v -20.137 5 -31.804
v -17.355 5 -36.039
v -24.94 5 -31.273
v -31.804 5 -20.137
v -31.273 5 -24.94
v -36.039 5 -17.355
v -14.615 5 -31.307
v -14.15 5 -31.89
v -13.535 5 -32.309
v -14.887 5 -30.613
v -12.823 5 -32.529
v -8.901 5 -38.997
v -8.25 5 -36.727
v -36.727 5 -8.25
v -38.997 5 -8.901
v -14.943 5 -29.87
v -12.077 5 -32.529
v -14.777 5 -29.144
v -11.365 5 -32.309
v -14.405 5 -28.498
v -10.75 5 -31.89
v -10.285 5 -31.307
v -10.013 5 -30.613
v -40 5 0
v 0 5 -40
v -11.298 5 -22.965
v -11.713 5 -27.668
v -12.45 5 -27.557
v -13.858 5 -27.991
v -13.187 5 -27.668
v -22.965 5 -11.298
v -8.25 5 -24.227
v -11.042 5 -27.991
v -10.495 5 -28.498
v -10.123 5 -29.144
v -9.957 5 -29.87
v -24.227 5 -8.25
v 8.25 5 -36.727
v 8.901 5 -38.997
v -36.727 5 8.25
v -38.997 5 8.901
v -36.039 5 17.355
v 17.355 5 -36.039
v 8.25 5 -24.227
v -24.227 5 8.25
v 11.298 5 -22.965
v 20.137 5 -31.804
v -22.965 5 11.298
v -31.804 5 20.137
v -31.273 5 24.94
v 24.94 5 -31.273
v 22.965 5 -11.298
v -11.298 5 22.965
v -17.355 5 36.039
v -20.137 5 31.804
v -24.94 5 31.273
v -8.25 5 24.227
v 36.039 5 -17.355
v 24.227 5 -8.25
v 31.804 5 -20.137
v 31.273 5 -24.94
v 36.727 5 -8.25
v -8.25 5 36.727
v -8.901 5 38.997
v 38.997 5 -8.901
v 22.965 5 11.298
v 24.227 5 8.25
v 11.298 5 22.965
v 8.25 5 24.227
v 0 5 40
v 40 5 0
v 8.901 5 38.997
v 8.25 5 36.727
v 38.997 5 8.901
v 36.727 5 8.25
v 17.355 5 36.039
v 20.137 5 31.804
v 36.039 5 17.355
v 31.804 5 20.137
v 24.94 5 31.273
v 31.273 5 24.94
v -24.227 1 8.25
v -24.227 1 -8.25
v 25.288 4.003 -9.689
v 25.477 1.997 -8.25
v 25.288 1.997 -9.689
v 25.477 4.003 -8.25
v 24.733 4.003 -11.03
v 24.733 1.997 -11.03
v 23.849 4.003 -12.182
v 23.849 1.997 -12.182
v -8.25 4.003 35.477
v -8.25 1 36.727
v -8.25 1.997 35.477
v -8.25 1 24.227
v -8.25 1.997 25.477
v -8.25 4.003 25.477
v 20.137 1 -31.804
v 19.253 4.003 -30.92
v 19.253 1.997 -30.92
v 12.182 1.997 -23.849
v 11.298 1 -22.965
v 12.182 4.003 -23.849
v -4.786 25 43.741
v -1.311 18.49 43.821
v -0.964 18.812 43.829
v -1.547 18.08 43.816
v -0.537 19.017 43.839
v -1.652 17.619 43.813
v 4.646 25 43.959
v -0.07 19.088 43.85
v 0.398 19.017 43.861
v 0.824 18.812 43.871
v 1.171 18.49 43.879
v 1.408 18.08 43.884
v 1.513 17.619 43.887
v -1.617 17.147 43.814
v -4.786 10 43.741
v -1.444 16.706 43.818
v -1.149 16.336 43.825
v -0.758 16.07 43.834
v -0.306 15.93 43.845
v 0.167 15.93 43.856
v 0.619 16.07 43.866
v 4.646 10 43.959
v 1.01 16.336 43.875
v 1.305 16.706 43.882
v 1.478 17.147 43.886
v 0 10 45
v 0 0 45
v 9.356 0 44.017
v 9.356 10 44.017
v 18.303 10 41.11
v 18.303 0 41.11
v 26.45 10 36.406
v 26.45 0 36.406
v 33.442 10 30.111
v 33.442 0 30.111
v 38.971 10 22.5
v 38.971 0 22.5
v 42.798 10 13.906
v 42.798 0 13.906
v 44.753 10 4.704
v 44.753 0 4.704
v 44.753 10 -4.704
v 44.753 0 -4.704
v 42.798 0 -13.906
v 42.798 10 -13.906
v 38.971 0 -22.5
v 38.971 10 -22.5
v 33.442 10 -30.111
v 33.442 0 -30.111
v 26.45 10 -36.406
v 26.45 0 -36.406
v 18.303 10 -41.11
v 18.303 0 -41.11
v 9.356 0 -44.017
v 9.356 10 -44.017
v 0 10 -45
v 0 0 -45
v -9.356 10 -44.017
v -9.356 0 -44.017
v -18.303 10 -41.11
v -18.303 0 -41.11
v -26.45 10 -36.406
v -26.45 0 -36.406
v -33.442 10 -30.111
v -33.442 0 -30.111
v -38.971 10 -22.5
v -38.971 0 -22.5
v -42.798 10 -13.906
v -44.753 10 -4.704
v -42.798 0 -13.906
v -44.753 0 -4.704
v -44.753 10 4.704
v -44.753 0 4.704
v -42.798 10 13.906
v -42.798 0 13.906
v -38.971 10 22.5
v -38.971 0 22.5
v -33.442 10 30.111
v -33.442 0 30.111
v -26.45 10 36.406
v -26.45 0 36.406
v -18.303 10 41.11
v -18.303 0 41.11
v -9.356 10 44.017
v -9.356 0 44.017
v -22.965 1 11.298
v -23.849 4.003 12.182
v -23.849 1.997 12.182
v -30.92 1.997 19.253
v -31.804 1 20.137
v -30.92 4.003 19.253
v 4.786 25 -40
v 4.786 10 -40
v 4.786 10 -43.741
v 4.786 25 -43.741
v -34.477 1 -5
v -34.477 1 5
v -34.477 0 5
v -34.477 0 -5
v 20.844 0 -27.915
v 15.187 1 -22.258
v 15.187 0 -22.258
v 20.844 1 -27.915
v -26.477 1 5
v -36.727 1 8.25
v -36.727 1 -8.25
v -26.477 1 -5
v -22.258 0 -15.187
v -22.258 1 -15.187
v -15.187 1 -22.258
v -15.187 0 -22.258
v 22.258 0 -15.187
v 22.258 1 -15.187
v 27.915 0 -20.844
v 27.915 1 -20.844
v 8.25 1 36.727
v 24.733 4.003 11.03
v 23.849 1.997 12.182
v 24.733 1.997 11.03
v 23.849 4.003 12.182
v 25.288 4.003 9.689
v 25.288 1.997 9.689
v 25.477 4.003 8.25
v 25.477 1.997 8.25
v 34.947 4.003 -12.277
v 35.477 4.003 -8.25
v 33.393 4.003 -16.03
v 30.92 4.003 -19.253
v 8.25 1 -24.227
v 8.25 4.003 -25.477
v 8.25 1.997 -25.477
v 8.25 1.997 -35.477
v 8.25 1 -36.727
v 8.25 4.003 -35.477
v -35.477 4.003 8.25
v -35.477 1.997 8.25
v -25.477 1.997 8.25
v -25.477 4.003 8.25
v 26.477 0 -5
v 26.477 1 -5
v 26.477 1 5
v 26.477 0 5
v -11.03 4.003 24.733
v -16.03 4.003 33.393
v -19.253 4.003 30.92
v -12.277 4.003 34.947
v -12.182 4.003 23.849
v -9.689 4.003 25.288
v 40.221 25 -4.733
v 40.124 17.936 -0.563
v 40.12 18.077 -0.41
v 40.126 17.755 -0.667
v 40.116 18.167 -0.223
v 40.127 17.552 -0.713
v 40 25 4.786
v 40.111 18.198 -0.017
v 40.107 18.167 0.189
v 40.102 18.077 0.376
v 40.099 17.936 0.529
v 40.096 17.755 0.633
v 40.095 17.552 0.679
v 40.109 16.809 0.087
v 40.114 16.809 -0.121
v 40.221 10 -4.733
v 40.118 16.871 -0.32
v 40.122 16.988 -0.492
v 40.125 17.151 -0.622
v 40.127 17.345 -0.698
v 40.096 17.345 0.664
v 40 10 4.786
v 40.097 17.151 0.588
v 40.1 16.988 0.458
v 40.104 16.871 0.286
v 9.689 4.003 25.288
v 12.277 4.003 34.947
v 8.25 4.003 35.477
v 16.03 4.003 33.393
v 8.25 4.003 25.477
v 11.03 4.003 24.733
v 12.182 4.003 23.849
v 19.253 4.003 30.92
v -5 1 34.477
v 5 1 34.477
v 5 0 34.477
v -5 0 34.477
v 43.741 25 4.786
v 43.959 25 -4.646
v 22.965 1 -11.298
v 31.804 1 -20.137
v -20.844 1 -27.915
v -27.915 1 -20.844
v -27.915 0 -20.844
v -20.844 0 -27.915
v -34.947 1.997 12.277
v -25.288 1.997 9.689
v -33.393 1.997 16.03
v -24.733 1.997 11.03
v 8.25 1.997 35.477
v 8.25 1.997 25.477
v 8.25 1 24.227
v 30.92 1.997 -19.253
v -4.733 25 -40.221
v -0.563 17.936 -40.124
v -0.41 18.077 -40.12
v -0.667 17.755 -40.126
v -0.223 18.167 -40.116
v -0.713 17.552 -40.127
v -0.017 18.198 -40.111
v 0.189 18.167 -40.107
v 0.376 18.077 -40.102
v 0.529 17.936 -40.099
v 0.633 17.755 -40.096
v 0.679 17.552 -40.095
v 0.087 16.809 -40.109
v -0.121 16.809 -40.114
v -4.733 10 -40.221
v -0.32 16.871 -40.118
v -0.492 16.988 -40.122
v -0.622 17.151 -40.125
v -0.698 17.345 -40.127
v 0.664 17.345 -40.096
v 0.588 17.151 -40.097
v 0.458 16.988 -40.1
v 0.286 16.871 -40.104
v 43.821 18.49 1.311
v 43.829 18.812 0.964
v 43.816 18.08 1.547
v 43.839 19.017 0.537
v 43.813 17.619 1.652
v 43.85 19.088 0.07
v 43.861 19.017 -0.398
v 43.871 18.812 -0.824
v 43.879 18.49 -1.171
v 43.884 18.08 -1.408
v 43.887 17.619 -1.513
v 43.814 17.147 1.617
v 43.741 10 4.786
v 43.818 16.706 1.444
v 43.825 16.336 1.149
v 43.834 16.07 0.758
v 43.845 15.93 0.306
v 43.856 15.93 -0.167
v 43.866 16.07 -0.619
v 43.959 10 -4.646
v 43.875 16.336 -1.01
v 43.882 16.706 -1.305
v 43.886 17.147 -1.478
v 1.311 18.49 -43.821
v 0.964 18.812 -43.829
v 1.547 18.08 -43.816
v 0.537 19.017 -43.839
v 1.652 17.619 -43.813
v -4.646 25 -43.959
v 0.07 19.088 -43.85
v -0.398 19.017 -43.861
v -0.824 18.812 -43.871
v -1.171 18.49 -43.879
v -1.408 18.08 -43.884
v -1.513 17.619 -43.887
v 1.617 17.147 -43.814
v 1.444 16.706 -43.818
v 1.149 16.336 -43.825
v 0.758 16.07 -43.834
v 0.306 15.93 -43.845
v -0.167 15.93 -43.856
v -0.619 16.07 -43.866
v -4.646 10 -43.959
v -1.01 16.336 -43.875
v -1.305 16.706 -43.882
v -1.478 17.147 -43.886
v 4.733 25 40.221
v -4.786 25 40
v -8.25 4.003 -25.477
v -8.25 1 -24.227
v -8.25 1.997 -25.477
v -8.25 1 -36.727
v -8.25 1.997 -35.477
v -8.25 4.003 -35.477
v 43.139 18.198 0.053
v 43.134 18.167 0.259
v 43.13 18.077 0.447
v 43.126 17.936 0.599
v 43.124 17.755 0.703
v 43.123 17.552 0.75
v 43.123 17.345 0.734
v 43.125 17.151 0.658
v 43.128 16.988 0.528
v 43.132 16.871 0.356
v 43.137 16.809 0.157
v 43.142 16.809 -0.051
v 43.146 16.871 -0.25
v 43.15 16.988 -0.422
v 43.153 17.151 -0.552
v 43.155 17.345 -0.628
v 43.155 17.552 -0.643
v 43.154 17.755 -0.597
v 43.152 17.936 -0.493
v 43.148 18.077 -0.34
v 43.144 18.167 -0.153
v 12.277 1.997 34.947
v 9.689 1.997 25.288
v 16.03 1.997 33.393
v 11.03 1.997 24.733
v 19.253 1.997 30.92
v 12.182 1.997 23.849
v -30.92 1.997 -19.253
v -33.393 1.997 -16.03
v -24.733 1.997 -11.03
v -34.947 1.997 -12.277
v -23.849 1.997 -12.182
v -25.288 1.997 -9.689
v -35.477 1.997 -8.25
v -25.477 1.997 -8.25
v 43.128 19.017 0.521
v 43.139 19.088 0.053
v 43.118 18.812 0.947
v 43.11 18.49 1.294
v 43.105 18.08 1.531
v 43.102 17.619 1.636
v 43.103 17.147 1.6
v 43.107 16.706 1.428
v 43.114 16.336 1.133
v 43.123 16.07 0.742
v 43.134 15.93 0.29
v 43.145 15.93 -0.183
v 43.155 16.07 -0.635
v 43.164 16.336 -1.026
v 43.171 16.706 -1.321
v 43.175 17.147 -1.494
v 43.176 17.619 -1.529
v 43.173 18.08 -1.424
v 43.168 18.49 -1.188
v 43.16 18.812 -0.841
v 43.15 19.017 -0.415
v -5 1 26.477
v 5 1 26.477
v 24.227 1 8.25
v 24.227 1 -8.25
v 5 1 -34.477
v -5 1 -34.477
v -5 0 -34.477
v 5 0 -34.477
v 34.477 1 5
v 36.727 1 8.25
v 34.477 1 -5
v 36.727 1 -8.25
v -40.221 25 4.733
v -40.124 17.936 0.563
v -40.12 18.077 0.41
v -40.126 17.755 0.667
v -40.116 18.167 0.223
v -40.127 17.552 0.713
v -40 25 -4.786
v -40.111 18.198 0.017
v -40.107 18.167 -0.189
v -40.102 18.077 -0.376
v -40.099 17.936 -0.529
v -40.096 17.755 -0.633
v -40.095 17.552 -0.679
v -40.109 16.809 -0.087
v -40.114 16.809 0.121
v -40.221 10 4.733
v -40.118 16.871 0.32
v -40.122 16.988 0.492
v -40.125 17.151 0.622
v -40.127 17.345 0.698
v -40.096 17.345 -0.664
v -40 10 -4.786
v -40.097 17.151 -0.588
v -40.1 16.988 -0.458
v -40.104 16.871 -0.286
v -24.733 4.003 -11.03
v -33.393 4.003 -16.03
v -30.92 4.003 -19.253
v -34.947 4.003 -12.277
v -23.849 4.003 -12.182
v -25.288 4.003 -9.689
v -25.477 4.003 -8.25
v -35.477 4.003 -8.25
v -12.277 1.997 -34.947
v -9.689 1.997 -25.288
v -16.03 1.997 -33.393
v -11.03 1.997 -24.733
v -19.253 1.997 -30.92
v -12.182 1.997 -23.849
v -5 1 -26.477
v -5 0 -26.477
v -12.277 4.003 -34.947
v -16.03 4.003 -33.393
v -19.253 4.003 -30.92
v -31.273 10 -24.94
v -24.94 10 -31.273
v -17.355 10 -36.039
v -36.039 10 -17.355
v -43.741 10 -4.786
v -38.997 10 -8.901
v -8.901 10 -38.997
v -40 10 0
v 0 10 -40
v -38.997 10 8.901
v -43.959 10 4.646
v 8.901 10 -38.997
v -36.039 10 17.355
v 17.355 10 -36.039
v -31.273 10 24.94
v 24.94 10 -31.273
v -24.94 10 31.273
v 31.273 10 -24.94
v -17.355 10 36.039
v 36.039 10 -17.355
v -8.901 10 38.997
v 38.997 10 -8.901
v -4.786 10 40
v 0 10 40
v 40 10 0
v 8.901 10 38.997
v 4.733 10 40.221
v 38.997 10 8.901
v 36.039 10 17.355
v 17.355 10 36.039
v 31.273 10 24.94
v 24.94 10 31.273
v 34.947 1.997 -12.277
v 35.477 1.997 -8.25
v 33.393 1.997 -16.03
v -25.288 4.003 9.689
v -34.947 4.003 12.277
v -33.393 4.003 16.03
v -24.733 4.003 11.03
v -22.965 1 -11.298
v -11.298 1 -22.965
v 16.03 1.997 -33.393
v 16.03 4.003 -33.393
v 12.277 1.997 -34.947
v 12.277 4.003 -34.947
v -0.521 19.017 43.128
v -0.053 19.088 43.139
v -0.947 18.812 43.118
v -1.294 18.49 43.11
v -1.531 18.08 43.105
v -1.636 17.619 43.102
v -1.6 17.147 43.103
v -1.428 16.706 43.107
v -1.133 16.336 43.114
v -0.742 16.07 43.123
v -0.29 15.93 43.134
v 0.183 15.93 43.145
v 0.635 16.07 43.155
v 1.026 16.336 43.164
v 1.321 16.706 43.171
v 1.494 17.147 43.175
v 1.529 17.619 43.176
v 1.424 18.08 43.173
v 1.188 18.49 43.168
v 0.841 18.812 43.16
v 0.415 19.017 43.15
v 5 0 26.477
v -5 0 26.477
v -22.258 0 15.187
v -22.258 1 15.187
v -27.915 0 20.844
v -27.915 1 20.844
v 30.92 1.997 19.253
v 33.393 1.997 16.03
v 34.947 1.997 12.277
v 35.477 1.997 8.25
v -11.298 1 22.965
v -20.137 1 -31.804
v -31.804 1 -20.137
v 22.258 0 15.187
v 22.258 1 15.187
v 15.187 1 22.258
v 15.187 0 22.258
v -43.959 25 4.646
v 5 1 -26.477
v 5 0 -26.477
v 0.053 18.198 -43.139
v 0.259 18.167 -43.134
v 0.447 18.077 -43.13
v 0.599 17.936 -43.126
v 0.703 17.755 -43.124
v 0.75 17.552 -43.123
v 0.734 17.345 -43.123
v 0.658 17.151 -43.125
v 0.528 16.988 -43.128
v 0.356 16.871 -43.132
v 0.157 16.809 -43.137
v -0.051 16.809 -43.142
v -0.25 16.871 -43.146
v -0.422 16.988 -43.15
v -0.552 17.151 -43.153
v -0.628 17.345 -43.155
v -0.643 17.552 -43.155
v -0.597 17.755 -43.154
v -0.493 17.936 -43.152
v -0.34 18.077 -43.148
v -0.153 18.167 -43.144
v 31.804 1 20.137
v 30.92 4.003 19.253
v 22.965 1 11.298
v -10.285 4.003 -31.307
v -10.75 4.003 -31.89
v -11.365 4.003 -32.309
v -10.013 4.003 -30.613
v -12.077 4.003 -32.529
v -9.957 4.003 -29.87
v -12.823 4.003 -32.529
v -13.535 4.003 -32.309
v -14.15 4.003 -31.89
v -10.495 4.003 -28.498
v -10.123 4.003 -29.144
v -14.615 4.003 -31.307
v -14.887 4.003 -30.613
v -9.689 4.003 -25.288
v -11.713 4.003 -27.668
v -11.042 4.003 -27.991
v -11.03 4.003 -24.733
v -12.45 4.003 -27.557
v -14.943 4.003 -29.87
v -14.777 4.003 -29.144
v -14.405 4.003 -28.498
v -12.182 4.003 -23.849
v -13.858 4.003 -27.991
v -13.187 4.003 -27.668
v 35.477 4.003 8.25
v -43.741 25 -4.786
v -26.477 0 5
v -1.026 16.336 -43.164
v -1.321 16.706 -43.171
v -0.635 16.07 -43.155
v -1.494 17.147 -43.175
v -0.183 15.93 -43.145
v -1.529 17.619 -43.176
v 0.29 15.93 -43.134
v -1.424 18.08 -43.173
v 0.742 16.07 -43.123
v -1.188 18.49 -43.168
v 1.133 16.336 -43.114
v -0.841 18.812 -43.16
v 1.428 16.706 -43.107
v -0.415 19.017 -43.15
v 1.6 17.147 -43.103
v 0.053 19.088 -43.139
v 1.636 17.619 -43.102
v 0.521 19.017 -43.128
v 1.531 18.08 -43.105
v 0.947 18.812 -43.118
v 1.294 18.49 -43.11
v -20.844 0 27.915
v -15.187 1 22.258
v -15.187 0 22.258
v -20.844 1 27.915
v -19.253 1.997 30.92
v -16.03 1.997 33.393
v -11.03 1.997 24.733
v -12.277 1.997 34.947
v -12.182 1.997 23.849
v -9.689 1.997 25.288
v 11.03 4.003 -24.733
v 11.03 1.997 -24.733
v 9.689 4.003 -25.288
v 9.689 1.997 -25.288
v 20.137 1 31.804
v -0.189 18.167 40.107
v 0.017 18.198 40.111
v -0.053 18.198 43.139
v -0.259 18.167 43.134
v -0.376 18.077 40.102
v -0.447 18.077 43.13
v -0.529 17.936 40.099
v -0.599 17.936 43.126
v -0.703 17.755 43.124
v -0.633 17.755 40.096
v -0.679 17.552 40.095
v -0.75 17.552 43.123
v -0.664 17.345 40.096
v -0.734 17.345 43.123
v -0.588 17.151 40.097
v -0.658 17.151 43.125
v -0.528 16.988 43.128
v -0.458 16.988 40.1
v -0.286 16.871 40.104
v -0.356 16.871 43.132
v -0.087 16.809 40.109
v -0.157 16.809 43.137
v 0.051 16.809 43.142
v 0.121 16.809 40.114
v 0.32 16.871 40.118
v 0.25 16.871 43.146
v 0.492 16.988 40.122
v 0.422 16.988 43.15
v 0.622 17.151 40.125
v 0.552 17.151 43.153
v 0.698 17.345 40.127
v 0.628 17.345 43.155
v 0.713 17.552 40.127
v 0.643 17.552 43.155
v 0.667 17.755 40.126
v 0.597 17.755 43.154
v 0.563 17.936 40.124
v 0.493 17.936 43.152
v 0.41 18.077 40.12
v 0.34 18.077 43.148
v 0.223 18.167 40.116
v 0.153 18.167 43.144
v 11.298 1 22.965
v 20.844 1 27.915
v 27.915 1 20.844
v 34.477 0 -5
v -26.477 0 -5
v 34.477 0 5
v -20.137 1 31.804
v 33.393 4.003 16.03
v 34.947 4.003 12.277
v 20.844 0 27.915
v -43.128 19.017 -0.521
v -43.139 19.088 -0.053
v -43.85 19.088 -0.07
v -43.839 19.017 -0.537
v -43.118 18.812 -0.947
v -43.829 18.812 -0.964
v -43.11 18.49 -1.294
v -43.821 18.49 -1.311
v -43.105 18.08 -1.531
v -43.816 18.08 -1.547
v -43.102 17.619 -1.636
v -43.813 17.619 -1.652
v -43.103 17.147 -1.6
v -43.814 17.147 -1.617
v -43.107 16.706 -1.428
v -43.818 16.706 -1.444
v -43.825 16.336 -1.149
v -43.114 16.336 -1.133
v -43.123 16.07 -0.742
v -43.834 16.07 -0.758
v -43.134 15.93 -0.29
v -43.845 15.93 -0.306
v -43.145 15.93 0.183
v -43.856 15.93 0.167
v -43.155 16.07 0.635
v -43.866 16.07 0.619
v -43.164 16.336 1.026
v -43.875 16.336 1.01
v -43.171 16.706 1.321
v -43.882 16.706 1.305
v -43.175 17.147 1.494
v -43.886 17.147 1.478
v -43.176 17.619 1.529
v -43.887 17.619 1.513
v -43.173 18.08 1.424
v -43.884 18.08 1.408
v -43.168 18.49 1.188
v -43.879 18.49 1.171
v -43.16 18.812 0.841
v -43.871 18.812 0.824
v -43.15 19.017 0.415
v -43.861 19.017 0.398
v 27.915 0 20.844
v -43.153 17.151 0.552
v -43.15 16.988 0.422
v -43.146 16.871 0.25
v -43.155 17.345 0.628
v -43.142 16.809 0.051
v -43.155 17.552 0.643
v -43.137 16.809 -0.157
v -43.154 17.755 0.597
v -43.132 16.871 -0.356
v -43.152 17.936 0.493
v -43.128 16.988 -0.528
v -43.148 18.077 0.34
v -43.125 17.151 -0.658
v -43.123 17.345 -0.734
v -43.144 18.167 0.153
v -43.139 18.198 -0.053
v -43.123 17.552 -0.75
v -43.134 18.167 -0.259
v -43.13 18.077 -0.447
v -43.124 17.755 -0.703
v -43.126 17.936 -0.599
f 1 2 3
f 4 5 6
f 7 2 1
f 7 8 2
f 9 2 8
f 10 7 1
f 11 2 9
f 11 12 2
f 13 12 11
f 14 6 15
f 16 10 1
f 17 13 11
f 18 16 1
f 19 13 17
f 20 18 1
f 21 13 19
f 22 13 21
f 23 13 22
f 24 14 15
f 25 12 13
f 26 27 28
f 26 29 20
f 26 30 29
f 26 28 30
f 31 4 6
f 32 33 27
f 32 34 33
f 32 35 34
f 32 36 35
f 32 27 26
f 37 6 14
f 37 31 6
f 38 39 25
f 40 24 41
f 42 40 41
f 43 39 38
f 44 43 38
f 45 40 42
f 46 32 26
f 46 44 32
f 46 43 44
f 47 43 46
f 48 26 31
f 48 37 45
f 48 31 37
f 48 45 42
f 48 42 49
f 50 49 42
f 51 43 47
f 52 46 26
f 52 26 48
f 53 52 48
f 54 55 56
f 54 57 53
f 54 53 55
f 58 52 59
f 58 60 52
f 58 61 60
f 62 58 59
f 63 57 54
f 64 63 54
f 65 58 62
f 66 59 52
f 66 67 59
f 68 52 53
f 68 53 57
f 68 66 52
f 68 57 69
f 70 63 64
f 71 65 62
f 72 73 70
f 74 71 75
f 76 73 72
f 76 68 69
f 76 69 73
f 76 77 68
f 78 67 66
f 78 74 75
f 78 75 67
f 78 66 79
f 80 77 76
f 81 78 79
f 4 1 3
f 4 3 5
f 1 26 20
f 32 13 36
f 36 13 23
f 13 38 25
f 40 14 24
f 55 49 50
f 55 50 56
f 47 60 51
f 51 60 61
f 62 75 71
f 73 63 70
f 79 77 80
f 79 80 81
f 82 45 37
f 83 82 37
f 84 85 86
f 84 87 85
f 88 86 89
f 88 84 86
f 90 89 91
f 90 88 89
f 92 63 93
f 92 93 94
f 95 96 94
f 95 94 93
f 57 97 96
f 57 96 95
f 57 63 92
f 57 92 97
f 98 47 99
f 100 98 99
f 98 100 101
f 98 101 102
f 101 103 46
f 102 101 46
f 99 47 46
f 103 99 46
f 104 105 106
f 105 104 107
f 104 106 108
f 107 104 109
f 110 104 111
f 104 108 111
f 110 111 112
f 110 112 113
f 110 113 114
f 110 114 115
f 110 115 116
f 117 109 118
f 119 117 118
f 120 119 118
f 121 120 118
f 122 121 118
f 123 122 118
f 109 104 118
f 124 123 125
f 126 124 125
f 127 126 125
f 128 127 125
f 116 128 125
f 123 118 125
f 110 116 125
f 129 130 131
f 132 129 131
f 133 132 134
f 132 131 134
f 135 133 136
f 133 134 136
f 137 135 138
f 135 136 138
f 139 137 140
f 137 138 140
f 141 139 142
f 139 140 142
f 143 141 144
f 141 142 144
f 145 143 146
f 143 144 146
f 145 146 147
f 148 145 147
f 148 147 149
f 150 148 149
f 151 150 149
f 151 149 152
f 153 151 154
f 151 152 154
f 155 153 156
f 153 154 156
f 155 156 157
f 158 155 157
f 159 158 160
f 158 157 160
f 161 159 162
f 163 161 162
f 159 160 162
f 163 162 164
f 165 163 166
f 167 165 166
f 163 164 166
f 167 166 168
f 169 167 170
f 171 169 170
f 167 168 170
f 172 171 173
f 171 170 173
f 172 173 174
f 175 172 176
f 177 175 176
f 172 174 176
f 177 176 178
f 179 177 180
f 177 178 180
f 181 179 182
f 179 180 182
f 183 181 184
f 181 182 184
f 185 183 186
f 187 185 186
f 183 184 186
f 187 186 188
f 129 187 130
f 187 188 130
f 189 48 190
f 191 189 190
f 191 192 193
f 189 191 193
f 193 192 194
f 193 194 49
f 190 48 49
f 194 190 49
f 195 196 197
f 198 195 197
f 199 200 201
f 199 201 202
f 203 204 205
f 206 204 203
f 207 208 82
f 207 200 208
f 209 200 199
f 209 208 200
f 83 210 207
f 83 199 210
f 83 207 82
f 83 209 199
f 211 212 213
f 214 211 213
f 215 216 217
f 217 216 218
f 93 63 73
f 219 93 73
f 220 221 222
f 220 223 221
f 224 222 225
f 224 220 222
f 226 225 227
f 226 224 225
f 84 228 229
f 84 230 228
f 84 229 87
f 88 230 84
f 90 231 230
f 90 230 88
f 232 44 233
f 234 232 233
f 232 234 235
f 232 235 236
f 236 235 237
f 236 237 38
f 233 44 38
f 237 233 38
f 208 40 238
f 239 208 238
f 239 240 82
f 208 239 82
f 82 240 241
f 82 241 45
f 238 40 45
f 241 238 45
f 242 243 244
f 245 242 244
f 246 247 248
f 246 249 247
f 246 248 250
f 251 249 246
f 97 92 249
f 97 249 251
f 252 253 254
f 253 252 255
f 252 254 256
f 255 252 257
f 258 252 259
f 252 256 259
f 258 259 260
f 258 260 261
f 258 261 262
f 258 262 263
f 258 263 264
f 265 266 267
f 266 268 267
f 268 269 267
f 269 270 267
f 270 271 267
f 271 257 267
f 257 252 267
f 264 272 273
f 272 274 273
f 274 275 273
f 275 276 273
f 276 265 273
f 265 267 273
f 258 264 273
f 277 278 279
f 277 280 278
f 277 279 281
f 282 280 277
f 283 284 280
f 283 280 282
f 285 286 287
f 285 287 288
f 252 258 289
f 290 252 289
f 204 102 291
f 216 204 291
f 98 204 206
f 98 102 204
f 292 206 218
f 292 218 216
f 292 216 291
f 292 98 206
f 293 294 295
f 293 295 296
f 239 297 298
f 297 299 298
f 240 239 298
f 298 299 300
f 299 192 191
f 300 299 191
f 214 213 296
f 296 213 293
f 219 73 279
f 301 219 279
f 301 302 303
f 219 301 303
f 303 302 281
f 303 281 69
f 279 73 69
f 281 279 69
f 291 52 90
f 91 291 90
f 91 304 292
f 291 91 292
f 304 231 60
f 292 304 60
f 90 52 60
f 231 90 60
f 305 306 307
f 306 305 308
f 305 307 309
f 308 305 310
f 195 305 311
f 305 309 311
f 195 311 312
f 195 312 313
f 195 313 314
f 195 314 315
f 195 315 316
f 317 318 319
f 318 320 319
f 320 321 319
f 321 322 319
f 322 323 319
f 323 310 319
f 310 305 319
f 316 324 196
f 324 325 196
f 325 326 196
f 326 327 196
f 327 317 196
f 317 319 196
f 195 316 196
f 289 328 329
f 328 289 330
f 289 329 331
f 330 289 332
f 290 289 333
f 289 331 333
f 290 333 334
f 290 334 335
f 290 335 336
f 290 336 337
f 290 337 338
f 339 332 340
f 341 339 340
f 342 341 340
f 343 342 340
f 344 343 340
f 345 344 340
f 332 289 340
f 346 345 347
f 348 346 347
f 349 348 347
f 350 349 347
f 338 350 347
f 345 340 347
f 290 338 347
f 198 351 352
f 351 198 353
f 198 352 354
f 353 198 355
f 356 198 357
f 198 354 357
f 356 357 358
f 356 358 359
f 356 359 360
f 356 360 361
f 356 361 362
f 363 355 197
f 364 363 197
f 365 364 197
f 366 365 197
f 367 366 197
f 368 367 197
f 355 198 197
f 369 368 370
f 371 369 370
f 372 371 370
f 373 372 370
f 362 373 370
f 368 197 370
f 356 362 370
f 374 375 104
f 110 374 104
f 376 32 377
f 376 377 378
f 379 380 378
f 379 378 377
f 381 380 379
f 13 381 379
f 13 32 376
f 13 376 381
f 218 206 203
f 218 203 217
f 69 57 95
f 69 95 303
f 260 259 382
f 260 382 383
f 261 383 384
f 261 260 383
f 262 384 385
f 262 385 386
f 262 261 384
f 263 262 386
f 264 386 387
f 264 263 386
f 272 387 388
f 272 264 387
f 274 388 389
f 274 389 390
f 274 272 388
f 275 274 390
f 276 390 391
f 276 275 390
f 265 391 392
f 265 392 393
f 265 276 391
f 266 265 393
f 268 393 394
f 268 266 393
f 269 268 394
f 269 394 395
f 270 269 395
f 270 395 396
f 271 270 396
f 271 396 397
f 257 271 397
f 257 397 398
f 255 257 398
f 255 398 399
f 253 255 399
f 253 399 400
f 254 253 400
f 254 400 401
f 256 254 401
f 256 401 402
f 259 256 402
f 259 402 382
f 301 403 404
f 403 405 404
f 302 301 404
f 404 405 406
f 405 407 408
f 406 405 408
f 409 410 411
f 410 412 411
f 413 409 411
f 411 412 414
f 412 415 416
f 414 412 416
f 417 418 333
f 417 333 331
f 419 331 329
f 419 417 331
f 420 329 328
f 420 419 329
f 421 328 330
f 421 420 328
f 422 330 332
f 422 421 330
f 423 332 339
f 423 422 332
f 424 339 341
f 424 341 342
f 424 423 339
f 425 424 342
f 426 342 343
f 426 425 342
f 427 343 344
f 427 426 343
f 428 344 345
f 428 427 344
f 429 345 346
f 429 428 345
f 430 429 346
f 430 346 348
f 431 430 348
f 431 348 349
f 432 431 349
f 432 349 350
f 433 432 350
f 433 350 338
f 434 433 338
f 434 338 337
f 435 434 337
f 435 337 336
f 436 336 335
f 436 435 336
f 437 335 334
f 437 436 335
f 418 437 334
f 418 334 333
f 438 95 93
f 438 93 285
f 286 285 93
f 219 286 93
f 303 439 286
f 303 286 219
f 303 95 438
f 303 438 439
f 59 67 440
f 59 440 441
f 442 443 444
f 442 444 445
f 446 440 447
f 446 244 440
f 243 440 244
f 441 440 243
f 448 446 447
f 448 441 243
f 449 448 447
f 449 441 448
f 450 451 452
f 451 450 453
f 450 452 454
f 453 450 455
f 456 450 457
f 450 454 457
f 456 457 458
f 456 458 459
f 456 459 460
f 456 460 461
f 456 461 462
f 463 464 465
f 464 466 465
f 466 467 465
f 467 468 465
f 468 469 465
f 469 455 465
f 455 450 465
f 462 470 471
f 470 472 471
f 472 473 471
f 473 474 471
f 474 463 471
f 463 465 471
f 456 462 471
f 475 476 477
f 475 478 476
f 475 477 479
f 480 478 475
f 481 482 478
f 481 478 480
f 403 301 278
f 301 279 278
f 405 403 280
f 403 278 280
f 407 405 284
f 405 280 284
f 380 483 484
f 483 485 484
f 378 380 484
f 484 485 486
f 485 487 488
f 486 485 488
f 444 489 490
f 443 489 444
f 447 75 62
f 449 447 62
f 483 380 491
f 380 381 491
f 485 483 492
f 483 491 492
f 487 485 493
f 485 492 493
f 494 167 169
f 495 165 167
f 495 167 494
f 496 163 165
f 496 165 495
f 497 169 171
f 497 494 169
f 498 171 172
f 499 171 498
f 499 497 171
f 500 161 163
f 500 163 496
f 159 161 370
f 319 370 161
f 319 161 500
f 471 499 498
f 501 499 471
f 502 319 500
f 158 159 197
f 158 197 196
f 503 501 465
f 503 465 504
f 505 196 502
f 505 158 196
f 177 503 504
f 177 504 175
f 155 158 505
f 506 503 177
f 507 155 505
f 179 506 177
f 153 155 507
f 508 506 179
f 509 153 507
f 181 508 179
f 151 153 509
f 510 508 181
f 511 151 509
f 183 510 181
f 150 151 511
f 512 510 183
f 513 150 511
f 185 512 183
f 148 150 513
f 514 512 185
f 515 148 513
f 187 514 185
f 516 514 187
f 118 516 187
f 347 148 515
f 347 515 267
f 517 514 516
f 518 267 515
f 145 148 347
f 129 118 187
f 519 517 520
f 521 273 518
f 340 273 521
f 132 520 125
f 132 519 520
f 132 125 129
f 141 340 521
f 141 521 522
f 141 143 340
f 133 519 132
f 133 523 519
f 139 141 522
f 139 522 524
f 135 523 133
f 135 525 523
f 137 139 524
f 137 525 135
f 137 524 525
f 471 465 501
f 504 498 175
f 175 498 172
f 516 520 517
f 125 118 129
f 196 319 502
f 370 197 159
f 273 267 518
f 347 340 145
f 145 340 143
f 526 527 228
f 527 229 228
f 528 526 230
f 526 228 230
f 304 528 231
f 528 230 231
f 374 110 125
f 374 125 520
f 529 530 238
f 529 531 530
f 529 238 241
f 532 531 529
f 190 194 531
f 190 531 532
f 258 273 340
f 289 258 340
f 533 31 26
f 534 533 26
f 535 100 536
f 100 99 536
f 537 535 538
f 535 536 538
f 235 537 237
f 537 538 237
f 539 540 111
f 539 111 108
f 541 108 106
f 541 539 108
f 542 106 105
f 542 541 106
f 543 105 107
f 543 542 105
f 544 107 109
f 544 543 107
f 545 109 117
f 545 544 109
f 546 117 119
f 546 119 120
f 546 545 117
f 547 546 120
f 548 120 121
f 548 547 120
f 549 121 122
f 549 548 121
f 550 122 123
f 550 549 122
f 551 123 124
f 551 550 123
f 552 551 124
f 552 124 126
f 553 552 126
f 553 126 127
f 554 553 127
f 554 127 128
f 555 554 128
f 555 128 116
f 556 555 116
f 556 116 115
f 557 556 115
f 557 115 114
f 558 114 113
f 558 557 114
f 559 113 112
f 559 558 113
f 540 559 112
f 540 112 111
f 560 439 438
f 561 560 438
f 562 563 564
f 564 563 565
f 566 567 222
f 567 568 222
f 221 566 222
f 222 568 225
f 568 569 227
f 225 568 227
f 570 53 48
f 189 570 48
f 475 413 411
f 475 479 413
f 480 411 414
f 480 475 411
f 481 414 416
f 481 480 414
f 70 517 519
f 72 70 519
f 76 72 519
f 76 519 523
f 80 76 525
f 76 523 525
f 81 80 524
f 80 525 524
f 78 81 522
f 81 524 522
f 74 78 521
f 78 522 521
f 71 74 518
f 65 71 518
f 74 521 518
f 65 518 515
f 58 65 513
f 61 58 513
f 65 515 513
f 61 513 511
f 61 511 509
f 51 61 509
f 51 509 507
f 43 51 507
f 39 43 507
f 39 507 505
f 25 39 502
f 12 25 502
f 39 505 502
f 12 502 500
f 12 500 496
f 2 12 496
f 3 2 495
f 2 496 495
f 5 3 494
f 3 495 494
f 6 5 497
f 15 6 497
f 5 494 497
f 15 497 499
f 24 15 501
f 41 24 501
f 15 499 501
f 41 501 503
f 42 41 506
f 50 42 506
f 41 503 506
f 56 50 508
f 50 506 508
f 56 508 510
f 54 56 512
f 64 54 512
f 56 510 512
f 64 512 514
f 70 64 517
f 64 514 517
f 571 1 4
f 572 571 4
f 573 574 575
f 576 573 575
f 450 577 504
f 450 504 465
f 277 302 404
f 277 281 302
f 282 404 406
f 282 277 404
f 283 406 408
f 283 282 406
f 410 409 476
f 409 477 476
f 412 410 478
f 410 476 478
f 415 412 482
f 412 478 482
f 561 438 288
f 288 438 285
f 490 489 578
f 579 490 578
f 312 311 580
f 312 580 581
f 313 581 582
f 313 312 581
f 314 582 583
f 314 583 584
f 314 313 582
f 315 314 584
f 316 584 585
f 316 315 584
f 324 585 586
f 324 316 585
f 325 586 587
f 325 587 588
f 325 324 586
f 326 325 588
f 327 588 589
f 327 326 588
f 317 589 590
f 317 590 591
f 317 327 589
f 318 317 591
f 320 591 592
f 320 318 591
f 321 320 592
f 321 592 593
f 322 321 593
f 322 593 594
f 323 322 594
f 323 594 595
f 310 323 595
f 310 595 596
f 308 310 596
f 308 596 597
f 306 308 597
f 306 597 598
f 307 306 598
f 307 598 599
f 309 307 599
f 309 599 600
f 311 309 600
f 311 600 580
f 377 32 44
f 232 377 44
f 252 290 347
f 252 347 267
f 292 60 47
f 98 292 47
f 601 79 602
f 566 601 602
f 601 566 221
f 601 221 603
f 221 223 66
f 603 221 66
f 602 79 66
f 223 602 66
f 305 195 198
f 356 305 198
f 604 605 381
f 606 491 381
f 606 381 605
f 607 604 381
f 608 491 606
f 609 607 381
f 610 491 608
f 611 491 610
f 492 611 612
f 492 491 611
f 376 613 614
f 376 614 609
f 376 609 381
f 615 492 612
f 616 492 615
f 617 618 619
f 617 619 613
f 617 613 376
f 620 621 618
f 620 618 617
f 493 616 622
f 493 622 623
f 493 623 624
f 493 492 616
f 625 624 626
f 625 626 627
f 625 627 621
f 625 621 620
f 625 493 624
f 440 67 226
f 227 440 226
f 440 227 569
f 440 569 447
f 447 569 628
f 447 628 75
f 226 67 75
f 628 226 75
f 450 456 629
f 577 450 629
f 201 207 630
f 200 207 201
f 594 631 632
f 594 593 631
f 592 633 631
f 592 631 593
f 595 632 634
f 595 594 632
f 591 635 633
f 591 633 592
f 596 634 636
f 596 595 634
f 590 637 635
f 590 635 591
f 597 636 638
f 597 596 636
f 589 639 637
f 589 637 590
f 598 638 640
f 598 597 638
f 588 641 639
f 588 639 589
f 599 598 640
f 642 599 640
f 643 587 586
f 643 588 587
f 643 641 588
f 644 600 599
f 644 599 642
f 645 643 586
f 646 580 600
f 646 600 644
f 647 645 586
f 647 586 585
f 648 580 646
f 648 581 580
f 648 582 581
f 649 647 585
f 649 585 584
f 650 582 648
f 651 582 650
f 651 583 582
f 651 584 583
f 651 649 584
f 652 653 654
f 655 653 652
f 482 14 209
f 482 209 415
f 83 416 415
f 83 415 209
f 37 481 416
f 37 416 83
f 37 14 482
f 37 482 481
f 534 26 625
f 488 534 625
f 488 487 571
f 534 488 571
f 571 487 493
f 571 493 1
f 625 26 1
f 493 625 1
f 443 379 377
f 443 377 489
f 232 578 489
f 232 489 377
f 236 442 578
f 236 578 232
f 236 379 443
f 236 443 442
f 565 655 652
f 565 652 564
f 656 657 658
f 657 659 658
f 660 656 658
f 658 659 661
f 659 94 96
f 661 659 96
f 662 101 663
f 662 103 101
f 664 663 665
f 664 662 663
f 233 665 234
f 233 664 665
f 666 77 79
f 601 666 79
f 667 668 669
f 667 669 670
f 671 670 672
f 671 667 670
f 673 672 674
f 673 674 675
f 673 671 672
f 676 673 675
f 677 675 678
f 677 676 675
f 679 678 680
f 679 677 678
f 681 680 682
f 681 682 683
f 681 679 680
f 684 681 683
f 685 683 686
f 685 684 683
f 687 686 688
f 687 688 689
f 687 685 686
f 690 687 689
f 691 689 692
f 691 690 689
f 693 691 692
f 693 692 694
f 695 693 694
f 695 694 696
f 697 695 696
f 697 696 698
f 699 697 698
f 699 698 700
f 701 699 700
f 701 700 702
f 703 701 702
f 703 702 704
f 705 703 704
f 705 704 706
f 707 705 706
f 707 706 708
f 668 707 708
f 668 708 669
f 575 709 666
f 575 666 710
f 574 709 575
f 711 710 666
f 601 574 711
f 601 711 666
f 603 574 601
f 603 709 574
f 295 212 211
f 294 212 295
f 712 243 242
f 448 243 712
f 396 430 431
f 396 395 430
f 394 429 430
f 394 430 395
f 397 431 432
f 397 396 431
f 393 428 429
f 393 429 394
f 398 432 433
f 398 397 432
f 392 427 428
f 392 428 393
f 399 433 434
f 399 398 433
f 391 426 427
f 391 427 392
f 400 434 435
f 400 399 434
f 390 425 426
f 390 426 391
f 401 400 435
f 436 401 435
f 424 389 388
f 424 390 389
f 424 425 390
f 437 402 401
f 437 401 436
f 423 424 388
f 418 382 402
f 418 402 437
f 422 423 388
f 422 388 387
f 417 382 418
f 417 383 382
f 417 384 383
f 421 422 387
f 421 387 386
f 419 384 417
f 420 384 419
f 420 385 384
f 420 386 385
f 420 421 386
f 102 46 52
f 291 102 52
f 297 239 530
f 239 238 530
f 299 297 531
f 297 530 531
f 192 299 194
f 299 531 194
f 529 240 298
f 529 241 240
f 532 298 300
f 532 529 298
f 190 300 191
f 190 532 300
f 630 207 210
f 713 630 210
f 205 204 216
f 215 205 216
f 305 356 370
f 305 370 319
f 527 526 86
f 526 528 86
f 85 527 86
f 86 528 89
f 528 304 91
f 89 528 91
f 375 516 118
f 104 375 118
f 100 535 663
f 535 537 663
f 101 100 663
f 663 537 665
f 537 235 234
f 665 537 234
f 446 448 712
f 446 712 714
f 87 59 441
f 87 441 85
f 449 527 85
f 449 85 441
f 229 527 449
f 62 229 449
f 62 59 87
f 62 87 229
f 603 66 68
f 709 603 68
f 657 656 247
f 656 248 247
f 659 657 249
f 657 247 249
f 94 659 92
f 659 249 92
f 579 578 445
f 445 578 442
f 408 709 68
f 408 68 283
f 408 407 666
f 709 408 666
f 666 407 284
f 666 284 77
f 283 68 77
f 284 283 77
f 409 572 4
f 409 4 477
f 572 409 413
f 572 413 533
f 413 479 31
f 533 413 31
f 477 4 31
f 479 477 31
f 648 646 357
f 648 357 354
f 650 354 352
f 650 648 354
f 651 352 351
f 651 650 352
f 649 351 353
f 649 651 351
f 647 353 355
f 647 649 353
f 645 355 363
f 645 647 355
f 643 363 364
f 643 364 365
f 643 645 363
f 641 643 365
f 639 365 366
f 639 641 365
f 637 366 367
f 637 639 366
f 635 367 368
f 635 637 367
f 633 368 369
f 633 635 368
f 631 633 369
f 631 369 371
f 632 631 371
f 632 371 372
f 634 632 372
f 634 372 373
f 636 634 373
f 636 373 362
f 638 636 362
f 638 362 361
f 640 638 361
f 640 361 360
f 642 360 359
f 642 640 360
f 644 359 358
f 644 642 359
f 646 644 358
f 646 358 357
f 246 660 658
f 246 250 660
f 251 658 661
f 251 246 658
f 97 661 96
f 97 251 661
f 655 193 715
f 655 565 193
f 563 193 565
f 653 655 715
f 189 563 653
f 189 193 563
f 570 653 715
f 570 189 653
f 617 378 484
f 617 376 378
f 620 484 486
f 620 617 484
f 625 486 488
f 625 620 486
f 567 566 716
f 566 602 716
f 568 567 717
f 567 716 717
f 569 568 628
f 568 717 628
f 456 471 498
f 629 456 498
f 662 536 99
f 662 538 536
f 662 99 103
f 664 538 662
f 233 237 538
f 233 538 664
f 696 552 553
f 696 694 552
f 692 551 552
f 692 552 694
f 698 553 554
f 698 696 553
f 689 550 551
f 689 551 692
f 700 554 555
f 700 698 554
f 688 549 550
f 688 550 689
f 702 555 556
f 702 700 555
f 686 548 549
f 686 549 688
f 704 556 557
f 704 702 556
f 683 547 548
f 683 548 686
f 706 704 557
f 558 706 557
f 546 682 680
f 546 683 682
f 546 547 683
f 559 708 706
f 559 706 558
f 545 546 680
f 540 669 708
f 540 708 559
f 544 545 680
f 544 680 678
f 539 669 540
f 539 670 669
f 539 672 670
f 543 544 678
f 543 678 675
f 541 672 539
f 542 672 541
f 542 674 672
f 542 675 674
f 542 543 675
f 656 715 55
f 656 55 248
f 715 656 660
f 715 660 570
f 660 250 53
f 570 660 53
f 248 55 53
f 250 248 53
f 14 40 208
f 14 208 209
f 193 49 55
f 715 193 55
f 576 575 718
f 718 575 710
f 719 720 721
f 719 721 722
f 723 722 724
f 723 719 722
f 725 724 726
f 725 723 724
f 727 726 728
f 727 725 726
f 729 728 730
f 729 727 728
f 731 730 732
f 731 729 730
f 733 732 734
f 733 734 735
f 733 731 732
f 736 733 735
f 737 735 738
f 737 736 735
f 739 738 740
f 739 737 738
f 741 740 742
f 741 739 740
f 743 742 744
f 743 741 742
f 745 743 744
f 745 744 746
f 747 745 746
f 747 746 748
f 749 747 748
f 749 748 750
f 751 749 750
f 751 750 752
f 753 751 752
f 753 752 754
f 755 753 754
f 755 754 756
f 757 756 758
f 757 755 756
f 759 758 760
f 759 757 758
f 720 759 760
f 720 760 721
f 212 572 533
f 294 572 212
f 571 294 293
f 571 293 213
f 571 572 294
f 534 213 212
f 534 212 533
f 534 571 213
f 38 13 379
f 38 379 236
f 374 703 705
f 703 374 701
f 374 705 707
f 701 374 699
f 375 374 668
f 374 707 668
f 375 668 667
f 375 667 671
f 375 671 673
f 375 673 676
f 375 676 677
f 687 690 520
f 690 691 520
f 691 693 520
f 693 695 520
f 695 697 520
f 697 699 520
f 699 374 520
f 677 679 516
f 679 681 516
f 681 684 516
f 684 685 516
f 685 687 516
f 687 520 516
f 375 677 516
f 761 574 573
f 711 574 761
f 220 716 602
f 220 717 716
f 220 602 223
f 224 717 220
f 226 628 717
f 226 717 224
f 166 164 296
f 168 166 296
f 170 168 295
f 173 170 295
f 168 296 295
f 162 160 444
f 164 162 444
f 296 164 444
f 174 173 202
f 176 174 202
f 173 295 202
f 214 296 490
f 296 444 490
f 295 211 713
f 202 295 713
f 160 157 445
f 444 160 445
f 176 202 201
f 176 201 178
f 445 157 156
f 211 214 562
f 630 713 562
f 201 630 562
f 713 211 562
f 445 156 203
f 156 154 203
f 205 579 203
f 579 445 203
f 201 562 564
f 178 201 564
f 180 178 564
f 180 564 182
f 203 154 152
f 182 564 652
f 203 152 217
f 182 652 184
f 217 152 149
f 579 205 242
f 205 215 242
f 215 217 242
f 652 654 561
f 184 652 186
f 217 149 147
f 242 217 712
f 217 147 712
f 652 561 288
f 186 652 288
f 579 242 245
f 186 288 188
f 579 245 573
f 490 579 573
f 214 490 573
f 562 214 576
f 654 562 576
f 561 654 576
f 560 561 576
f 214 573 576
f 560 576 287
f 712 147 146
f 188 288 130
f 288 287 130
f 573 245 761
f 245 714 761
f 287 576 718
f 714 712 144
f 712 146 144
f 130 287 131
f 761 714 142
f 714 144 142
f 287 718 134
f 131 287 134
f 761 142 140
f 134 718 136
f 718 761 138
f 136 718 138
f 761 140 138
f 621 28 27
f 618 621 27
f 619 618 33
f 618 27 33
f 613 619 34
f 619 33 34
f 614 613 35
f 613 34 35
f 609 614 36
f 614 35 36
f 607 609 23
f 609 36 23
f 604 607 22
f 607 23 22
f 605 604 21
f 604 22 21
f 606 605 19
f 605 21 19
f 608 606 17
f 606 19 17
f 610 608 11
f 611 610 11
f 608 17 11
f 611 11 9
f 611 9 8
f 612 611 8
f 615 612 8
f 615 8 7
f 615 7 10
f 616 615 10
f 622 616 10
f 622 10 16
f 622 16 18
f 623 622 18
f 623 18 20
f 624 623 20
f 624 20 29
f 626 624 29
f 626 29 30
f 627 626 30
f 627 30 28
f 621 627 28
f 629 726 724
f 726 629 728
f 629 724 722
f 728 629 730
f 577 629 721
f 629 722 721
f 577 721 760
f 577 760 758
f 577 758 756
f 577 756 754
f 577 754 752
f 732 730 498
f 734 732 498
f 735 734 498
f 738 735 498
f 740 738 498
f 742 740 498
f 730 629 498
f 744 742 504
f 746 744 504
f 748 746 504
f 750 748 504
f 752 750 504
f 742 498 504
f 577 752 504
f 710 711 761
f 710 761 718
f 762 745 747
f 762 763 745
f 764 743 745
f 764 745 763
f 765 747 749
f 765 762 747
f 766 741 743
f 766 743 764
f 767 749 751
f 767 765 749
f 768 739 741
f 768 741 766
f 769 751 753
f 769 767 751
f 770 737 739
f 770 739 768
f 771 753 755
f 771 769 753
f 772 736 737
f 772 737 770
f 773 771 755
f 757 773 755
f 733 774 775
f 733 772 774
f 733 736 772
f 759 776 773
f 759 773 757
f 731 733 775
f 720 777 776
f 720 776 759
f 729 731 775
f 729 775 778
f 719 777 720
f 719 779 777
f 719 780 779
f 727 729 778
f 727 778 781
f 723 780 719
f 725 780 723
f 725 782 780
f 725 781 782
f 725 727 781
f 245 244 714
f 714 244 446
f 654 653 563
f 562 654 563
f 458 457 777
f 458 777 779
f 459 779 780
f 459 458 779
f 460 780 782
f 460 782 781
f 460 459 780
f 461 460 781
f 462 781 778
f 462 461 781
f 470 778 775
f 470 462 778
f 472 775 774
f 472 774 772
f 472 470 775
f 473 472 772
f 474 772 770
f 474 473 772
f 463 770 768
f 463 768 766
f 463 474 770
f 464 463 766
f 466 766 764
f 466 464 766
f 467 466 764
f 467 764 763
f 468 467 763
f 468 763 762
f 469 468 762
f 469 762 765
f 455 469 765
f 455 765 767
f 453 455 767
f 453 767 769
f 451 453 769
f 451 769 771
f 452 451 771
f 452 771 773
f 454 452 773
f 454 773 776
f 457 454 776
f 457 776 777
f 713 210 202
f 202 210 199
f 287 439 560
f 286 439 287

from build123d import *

# Parameters (mm, degrees)
SKETCH2_R                                     = 45
BOSS_EXTRUDE1_DEPTH                           = 10
SKETCH3_R                                     = 40
CUT_EXTRUDE1_DEPTH                            = 5
SKETCH4_W                                     = 16.5
SKETCH4_H                                     = 12.5
SKETCH4_W_2                                   = 12.5
SKETCH4_H_2                                   = 16.5
CUT_EXTRUDE2_DEPTH                            = 4
SKETCH6_W                                     = 10
SKETCH6_H                                     = 8
CUT_EXTRUDE3_DEPTH                            = 65.272855857
CIRPATTERN1_COUNT                             = 8
SKETCH7_W                                     = 10
SKETCH7_H                                     = 2.006854622
CUT_REVOLVE1_ANGLE                            = 45
CIRPATTERN8_COUNT                             = 8
CUT_EXTRUDE4_REACH                            = 65.836
SKETCH10_R                                    = 2.5
BOSS_EXTRUDE2_DEPTH                           = 15
CIRPATTERN9_COUNT                             = 4
CBORE_START                                   = 40.100162841
CBORE_FOR_00_BINDING_HEAD_MACHINE_S_2_R       = 0.6985
CBORE_FOR_00_BINDING_HEAD_MACHINE_SCREW_DEPTH = 3.739789051
CBORE_START_2                                 = 43.128751892
CBORE_FOR_00_BINDING_HEAD_MACHINE_S_3_O_R     = 1.5875
CBORE_FOR_00_BINDING_HEAD_MACHINE_S_3_O_R_2   = 0.6985
CBORE_FOR_00_BINDING_HEAD_MACHINE_S_3_DEPTH   = 0.7112
CIRPATTERN10_COUNT                            = 4


# Read off the part's stored shape, not the designer's step: CBORE for #00 Binding Head Machine Screw3
with BuildPart() as part:
    # Sketch2 → Boss-Extrude1 (new body)
    with BuildSketch(Plane(origin=(0, 0, 0), x_dir=(1, 0, 0), z_dir=(0, 1, 0))):
        with Locations(Location((0, 0, 0), (0, 0, 270))):
            Circle(SKETCH2_R)
    extrude(amount=BOSS_EXTRUDE1_DEPTH)

    # Sketch3 → Cut-Extrude1 (cut)
    with BuildSketch(Plane(origin=(0, 10, 0), x_dir=(1, 0, 0), z_dir=(0, 1, 0))):
        with Locations(Location((0, 0, 0), (0, 0, 270))):
            Circle(SKETCH3_R)
    extrude(amount=-CUT_EXTRUDE1_DEPTH, mode=Mode.SUBTRACT)

    # Sketch4 → Cut-Extrude2 (cut)
    with BuildSketch(Plane(origin=(0, 5, 0), x_dir=(1, 0, 0), z_dir=(0, 1, 0))):
        with Locations((0, 30.477478673)):
            Rectangle(SKETCH4_W, SKETCH4_H)
        Polygon((20.136618281, 31.80388017), (11.297783516, 22.965045405), (22.965045405, 11.297783516), (31.80388017, 20.136618281), align=None)
        with Locations((30.477478673, 0)):
            Rectangle(SKETCH4_W_2, SKETCH4_H_2)
        Polygon((31.80388017, -20.136618281), (22.965045405, -11.297783516), (11.297783516, -22.965045405), (20.136618281, -31.80388017), align=None)
        with Locations((0, -30.477478673)):
            Rectangle(SKETCH4_W, SKETCH4_H)
        Polygon((-20.136618281, -31.80388017), (-11.297783516, -22.965045405), (-22.965045405, -11.297783516), (-31.80388017, -20.136618281), align=None)
        with Locations((-30.477478673, 0)):
            Rectangle(SKETCH4_W_2, SKETCH4_H_2)
        Polygon((-31.80388017, 20.136618281), (-22.965045405, 11.297783516), (-11.297783516, 22.965045405), (-20.136618281, 31.80388017), align=None)
    extrude(amount=-CUT_EXTRUDE2_DEPTH, mode=Mode.SUBTRACT)

    # Sketch6 → Cut-Extrude3 (cut, through all)
    with BuildSketch(Plane(origin=(0, 1, 0), x_dir=(1, 0, 0), z_dir=(0, 1, 0))):
        with Locations((0, 30.477478673)):
            Rectangle(SKETCH6_W, SKETCH6_H)
    cut_extrude3 = extrude(amount=-CUT_EXTRUDE3_DEPTH, mode=Mode.SUBTRACT)

    # CirPattern1: Cut-Extrude3 ×8 about axis
    cirpattern1_axis = Axis((0, 0, 0), (0, 1, 0))
    for i in range(1, CIRPATTERN1_COUNT):
        add(cut_extrude3.rotate(cirpattern1_axis, i * 360 / CIRPATTERN1_COUNT), mode=Mode.SUBTRACT)

    # Sketch7 → Cut-Revolve1 (revolve, cut)
    with BuildSketch(Plane(origin=(-8.25, 0, 0), x_dir=(0, 0, -1), z_dir=(1, 0, 0))):
        with Locations((30.477478673, 3)):
            Rectangle(SKETCH7_W, SKETCH7_H)
    cut_revolve1 = revolve(axis=Axis((-8.25, 5, -19.91726189), (0, 1, 0)), revolution_arc=CUT_REVOLVE1_ANGLE, mode=Mode.SUBTRACT)

    # CirPattern8: Cut-Revolve1 ×8 about axis
    cirpattern8_axis = Axis((0, 0, 0), (0, 1, 0))
    for i in range(1, CIRPATTERN8_COUNT):
        add(cut_revolve1.rotate(cirpattern8_axis, i * 360 / CIRPATTERN8_COUNT), mode=Mode.SUBTRACT)

    # Sketch10 → Cut-Extrude4 (cut, up to next)
    with BuildSketch(Plane(origin=(0, 5, 0), x_dir=(1, 0, 0), z_dir=(0, 1, 0)), mode=Mode.PRIVATE) as cut_extrude4_sk1:
        with Locations(Location((-12.45, 30.056958852, 0), (0, 0, 270))):
            Circle(SKETCH10_R)
    cut_extrude4_tool1 = extrude(cut_extrude4_sk1.sketch, amount=-CUT_EXTRUDE4_REACH, mode=Mode.PRIVATE) & part.part
    add(cut_extrude4_tool1.solids().sort_by_distance((-12.45, 5, -30.056959))[0], mode=Mode.SUBTRACT)

    # Sketch11 → Boss-Extrude2 (add)
    with BuildSketch(Plane(origin=(0, 10, 0), x_dir=(1, 0, 0), z_dir=(0, 1, 0))):
        Polygon((40.22065381, 4.733059783), (39.999995725, -4.78576812), (43.740789465, -4.78576812), (43.959438442, 4.646390178), align=None)
    boss_extrude2 = extrude(amount=BOSS_EXTRUDE2_DEPTH)

    # CirPattern9: Boss-Extrude2 ×4 about axis
    cirpattern9_axis = Axis((0, 0, 0), (0, 1, 0))
    for i in range(1, CIRPATTERN9_COUNT):
        add(boss_extrude2.rotate(cirpattern9_axis, i * 360 / CIRPATTERN9_COUNT))

    # CBORE for _00 Binding Head Machine S 2 → CBORE for #00 Binding Head Machine Screw3 (cut)
    with BuildSketch(Plane(origin=(0, 0, 0), x_dir=(0, 1, 0), z_dir=(0.9997314236585955, 0, 0.02317499837233911)).offset(CBORE_START)):
        with Locations((17.5, -0.946556065)):
            Circle(CBORE_FOR_00_BINDING_HEAD_MACHINE_S_2_R)
    cbore_for_00_binding_head_machine_screw = extrude(amount=CBORE_FOR_00_BINDING_HEAD_MACHINE_SCREW_DEPTH, mode=Mode.SUBTRACT)

    # CBORE for _00 Binding Head Machine S 3 o → CBORE for _00 Binding Head Machine S 3 (cut)
    with BuildSketch(Plane(origin=(0, 0, 0), x_dir=(0, 1, 0), z_dir=(0.9997314236585955, 0, 0.02317499837233911)).offset(CBORE_START_2)):
        with Locations((17.5, -0.946556065)):
            Circle(CBORE_FOR_00_BINDING_HEAD_MACHINE_S_3_O_R)
        with Locations((17.5, -0.946556065)):
            Circle(CBORE_FOR_00_BINDING_HEAD_MACHINE_S_3_O_R_2, mode=Mode.SUBTRACT)
    cbore_for_00_binding_head_machine_s_3 = extrude(amount=CBORE_FOR_00_BINDING_HEAD_MACHINE_S_3_DEPTH, mode=Mode.SUBTRACT)

    # CirPattern10: CBORE for #00 Binding Head Machine Screw3, CBORE for _00 Binding Head Machine S 3 ×4 about axis
    cirpattern10_axis = Axis((0, 0, 0), (0, 1, 0))
    add([cbore_for_00_binding_head_machine_screw.rotate(cirpattern10_axis, i * 360 / CIRPATTERN10_COUNT) for i in range(1, CIRPATTERN10_COUNT)], mode=Mode.SUBTRACT)
    add([cbore_for_00_binding_head_machine_s_3.rotate(cirpattern10_axis, i * 360 / CIRPATTERN10_COUNT) for i in range(1, CIRPATTERN10_COUNT)], mode=Mode.SUBTRACT)


solid = part.part
